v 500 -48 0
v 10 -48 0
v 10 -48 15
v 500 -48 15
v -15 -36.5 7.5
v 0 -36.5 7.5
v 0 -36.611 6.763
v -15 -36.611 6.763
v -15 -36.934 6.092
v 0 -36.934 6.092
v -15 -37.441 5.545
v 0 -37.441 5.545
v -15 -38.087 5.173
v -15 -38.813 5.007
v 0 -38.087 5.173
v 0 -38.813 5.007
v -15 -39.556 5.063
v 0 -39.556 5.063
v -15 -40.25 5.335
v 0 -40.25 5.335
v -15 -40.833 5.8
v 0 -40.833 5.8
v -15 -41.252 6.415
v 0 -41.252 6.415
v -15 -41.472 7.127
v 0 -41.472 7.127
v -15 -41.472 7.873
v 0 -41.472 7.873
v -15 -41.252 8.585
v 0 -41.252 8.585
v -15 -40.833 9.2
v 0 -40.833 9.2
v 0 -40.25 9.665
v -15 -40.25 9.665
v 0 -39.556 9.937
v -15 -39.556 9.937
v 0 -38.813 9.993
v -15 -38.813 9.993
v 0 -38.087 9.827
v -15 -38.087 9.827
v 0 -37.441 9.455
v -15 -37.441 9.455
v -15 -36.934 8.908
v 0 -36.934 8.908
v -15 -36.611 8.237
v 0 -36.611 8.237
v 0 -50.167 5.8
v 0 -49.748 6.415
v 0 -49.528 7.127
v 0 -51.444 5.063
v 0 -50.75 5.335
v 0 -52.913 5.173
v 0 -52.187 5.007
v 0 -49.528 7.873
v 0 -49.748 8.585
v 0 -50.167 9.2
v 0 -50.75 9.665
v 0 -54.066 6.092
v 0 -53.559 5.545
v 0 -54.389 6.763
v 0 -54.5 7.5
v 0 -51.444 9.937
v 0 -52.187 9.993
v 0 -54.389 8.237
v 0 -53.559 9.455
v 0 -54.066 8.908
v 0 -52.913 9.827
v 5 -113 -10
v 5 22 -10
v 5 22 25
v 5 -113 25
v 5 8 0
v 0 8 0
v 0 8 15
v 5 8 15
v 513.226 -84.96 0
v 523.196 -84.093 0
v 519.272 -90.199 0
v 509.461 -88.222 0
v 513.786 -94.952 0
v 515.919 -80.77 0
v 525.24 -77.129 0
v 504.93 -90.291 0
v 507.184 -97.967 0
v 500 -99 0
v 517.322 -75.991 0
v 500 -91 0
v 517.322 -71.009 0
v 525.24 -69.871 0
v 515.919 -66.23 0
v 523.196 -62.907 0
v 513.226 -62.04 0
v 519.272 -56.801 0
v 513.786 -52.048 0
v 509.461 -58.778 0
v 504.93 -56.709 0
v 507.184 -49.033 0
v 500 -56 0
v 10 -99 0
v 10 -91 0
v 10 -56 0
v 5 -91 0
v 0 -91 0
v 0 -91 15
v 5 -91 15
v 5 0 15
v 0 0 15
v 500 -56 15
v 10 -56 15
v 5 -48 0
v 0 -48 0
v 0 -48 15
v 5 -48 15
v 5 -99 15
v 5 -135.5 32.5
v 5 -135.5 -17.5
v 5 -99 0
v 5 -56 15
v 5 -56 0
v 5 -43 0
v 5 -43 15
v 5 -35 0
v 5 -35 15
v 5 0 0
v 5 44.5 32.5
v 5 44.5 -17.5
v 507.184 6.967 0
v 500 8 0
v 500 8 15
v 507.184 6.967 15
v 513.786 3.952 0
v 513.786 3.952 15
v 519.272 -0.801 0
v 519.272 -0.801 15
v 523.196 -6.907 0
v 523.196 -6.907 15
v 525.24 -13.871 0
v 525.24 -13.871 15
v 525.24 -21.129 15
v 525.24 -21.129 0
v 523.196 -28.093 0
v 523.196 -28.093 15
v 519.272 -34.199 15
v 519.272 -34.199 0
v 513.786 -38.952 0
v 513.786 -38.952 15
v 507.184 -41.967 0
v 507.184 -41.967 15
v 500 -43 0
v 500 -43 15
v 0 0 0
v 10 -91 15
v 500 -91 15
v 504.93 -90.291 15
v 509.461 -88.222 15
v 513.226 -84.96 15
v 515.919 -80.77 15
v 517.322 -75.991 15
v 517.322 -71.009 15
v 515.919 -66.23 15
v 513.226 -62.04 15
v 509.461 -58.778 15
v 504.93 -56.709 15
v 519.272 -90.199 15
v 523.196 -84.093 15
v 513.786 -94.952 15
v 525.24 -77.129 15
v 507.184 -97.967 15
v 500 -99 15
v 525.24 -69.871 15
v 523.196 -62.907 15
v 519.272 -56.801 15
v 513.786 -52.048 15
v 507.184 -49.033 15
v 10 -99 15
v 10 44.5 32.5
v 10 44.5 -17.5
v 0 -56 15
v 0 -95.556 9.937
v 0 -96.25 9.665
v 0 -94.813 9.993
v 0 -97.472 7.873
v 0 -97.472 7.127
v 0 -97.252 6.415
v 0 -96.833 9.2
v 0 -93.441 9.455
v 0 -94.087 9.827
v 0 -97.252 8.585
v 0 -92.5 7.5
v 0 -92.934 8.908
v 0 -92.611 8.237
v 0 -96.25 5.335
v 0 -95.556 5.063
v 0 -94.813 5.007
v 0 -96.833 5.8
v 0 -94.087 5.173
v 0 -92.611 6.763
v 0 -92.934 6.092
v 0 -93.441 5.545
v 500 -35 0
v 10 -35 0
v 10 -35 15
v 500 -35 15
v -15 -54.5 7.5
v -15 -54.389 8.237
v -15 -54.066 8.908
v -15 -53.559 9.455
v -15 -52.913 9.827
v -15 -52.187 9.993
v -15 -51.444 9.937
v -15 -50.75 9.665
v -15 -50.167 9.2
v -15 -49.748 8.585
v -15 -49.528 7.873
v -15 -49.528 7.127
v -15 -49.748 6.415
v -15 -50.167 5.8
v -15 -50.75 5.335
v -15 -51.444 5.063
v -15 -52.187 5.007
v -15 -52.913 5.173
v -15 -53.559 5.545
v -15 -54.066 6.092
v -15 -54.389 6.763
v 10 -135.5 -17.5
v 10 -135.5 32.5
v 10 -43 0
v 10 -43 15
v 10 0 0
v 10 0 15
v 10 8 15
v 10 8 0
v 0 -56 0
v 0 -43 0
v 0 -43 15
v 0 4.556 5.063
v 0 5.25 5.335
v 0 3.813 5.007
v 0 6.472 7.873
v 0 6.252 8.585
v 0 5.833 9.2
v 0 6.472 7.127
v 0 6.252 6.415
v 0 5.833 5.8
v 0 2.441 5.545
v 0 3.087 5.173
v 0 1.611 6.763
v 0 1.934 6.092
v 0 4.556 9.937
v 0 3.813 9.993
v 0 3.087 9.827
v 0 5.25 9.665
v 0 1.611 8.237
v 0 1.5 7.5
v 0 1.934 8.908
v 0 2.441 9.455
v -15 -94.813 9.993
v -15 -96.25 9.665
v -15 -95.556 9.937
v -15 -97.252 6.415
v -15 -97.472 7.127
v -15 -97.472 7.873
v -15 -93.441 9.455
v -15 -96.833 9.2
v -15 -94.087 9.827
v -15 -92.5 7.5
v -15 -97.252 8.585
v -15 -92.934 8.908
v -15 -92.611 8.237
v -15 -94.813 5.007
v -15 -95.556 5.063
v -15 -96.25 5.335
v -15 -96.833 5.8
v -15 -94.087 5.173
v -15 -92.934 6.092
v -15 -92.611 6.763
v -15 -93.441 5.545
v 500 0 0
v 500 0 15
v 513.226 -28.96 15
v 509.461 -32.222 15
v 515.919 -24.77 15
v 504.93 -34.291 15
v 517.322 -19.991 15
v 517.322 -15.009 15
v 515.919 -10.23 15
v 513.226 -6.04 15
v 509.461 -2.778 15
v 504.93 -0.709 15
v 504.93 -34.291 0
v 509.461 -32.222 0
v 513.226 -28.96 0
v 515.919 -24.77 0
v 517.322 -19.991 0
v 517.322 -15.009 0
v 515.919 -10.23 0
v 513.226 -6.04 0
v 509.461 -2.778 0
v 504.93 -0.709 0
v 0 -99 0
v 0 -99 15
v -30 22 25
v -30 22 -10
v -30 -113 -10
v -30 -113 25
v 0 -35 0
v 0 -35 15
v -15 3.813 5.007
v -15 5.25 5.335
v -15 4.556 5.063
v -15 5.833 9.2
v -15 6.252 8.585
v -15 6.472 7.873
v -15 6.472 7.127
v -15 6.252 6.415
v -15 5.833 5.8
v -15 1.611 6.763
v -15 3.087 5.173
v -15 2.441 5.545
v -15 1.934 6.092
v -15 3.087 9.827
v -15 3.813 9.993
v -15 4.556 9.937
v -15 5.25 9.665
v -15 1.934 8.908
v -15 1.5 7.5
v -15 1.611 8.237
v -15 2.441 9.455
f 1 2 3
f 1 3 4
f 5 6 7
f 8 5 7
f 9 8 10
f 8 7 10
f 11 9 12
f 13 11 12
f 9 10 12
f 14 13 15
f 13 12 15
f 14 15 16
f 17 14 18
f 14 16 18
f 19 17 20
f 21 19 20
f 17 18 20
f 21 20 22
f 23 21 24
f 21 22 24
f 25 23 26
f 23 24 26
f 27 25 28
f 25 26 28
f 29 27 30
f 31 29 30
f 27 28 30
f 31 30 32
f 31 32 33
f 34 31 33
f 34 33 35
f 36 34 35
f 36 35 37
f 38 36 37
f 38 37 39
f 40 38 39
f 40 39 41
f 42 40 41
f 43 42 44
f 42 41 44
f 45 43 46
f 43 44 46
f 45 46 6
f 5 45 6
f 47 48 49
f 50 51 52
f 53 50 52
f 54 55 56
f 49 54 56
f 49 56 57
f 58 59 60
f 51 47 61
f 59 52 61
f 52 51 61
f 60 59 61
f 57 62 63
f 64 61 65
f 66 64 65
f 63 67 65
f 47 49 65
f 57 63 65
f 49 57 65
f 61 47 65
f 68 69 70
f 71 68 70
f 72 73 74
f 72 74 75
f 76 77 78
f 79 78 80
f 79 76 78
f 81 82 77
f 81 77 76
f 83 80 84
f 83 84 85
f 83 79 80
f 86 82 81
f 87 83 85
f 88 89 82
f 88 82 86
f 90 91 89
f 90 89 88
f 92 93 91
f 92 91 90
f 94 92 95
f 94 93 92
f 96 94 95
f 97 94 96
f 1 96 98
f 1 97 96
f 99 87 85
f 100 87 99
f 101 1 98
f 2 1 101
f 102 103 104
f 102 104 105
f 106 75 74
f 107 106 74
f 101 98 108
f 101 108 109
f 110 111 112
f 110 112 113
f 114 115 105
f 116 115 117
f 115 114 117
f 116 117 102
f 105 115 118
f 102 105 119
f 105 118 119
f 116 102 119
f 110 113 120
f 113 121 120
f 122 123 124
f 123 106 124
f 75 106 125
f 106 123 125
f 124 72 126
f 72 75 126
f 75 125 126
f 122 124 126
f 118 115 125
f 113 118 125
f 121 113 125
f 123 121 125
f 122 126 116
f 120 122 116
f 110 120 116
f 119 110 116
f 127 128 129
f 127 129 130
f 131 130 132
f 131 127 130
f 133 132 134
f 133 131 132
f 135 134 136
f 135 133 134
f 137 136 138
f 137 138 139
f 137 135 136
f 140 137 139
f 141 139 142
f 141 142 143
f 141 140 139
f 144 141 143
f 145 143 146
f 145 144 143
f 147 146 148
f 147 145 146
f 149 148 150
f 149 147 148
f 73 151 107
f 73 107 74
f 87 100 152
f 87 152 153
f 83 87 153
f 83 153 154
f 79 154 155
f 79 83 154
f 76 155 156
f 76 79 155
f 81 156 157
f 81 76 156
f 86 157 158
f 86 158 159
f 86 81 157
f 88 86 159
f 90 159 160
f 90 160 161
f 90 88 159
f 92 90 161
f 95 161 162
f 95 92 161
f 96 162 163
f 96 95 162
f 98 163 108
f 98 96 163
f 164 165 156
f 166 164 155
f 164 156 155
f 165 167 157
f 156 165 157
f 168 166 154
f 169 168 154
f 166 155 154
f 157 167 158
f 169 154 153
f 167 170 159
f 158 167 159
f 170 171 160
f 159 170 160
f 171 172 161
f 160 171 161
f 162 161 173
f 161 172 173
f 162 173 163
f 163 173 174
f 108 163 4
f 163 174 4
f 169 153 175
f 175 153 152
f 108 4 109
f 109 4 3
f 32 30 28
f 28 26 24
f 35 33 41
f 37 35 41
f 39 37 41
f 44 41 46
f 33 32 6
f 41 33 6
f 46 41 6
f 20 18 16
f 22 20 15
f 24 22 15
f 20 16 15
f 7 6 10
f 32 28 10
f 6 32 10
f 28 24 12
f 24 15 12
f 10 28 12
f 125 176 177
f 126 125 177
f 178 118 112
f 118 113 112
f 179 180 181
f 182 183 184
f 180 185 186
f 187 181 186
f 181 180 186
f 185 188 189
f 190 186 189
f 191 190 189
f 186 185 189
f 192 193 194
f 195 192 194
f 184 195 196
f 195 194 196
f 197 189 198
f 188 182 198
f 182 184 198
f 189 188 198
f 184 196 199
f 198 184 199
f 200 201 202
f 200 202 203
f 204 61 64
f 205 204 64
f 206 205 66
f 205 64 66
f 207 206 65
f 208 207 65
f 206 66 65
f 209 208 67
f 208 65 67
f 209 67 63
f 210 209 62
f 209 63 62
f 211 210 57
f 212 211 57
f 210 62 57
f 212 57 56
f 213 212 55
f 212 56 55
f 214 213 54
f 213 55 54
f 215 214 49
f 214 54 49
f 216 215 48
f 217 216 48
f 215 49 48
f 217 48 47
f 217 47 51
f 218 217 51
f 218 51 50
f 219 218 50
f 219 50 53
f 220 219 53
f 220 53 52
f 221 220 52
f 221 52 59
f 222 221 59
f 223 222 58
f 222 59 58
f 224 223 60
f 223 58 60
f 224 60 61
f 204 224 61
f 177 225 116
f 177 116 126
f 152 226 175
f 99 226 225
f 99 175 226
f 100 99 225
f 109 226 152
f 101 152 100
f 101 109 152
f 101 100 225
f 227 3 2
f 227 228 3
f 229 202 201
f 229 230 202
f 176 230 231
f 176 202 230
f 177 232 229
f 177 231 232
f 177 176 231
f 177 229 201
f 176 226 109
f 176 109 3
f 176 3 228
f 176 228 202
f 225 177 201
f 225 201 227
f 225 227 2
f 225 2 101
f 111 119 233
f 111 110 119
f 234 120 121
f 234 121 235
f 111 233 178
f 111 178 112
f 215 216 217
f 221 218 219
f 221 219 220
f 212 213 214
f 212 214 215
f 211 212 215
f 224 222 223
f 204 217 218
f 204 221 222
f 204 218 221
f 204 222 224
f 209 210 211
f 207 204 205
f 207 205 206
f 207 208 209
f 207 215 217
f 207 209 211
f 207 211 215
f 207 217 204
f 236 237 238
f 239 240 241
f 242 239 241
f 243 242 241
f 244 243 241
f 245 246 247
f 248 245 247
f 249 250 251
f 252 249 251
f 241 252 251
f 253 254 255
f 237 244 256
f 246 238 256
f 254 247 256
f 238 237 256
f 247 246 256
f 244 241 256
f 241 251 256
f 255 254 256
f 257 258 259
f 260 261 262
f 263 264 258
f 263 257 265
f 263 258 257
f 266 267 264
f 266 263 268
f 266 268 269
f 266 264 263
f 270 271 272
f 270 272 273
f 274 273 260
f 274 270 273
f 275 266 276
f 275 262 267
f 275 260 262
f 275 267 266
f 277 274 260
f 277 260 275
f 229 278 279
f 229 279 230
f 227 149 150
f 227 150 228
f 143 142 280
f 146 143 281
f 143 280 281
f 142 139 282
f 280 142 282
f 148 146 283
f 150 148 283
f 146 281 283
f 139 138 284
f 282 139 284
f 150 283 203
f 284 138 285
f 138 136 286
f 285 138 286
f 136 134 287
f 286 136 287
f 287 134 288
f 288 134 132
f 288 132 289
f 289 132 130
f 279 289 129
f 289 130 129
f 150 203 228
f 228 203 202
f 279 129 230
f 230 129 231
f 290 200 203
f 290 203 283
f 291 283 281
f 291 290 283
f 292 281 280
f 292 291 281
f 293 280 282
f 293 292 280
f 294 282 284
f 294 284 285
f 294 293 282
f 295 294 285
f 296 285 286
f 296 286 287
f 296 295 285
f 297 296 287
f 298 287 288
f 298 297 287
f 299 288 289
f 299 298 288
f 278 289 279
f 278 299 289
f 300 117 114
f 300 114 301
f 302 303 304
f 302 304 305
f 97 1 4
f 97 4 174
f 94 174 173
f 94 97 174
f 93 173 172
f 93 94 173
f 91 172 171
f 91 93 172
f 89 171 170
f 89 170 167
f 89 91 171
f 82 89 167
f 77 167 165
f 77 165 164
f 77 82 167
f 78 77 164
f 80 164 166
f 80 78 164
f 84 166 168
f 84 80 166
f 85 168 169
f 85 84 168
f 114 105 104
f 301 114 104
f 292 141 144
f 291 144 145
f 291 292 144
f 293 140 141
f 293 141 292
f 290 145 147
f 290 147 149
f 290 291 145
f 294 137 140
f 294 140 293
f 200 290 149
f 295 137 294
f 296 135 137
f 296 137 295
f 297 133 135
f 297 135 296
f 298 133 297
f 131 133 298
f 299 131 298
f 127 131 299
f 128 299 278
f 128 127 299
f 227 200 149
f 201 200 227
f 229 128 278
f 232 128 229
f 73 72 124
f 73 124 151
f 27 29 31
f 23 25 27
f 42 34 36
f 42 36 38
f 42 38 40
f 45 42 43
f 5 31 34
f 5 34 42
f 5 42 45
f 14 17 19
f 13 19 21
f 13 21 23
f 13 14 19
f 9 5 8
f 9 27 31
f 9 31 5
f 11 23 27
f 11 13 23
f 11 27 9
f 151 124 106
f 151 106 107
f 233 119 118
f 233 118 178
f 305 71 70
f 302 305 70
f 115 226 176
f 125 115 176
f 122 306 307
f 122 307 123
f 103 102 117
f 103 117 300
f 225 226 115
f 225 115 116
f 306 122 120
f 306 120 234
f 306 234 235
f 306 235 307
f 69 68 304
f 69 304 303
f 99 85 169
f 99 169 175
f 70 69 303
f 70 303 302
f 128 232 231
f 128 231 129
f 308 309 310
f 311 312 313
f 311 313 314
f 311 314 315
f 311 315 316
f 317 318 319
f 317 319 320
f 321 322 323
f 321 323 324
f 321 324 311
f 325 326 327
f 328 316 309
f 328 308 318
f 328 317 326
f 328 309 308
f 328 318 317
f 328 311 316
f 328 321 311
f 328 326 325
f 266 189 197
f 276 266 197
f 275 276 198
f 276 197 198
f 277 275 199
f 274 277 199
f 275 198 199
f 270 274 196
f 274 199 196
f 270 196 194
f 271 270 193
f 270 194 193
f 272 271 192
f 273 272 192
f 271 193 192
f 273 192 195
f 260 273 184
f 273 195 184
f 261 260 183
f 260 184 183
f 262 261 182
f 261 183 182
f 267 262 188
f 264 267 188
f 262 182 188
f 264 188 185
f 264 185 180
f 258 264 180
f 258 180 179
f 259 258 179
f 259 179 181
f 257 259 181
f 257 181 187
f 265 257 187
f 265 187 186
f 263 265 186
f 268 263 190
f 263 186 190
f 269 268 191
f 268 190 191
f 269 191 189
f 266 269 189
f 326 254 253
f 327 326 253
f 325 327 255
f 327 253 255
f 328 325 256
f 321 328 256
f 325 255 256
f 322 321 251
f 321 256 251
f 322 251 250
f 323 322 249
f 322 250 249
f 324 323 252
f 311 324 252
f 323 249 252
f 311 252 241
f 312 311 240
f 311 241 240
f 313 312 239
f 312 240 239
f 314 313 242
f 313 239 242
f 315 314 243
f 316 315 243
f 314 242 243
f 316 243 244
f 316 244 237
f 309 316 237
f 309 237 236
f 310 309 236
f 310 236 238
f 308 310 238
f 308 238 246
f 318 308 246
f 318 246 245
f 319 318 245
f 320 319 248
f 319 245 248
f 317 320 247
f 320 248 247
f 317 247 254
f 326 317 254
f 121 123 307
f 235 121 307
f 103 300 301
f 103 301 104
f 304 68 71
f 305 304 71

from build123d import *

# Parameters (mm, degrees)
BOSS_EXTRUDE1_DEPTH   = 15
BOSS_EXTRUDE1_2_DEPTH = 15
SKETCH3_R             = 2.5
BOSS_EXTRUDE2_DEPTH   = 15
BOSS_EXTRUDE2_2_DEPTH = 15
BOSS_EXTRUDE2_3_DEPTH = 15
BOSS_EXTRUDE2_4_DEPTH = 15
SKETCH5_W             = 50
SKETCH5_H             = 180
BOSS_EXTRUDE3_DEPTH   = 5
SKETCH7_W             = 35
SKETCH7_H             = 135
BOSS_EXTRUDE4_DEPTH   = 35


with BuildPart() as part:
    # Sketch1 → Boss-Extrude1 (new body)
    with BuildSketch(Plane.XY):
        with BuildLine():
            Line((500, -43), (0, -43))
            Line((0, -43), (0, -35))
            Line((0, -35), (8, -35))
            Line((8, -35), (500, -35))
            ThreePointArc((500, -35), (517.5, -17.5), (500, 0))
            Line((500, 0), (8, 0))
            Line((8, 0), (0, 0))
            Line((0, 0), (0, 8))
            Line((0, 8), (500, 8))
            ThreePointArc((500, 8), (525.5, -17.5), (500, -43))
        make_face()
    extrude(amount=BOSS_EXTRUDE1_DEPTH)



with BuildPart() as body_2:
    # Sketch1 → Boss-Extrude1 2 (new body)
    with BuildSketch(Plane.XY):
        with BuildLine():
            Line((8, -56), (0, -56))
            Line((0, -56), (0, -48))
            Line((0, -48), (500, -48))
            ThreePointArc((500, -48), (525.5, -73.5), (500, -99))
            Line((500, -99), (0, -99))
            Line((0, -99), (0, -91))
            Line((0, -91), (8, -91))
            Line((8, -91), (500, -91))
            ThreePointArc((500, -91), (517.5, -73.5), (500, -56))
            Line((500, -56), (8, -56))
        make_face()
    extrude(amount=BOSS_EXTRUDE1_2_DEPTH)


with BuildPart() as body_3:
    # Sketch3 → Boss-Extrude2 (new body)
    with BuildSketch(Plane.ZY):
        with Locations(Location((7.5, 4, 0), (0, 0, 270))):
            Circle(SKETCH3_R)
    extrude(amount=BOSS_EXTRUDE2_DEPTH)


with BuildPart() as body_4:
    # Sketch3 → Boss-Extrude2 2 (new body)
    with BuildSketch(Plane.ZY):
        with Locations(Location((7.5, -39, 0), (0, 0, 90))):
            Circle(SKETCH3_R)
    extrude(amount=BOSS_EXTRUDE2_2_DEPTH)


with BuildPart() as body_5:
    # Sketch3 → Boss-Extrude2 3 (new body)
    with BuildSketch(Plane.ZY):
        with Locations(Location((7.5, -52, 0), (0, 0, 270))):
            Circle(SKETCH3_R)
    extrude(amount=BOSS_EXTRUDE2_3_DEPTH)


with BuildPart() as body_6:
    # Sketch3 → Boss-Extrude2 4 (new body)
    with BuildSketch(Plane.ZY):
        with Locations(Location((7.5, -95, 0), (0, 0, 90))):
            Circle(SKETCH3_R)
    extrude(amount=BOSS_EXTRUDE2_4_DEPTH)


with BuildPart() as part_1:
    add(part.part)

    add(body_2.part)  # Boss-Extrude3 merges body 2
    # Sketch5 → Boss-Extrude3 (add)
    with BuildSketch(Plane(origin=(10, 0, 0), x_dir=(0, 0, -1), z_dir=(1, 0, 0))):
        with Locations((-7.5, -45.5)):
            Rectangle(SKETCH5_W, SKETCH5_H)
    extrude(amount=-BOSS_EXTRUDE3_DEPTH)


with BuildPart() as body_6_2:
    # Sketch7 → Boss-Extrude4 (new body)
    with BuildSketch(Plane.ZY.offset(-5)):
        with Locations((7.5, -45.5)):
            Rectangle(SKETCH7_W, SKETCH7_H)
    extrude(amount=BOSS_EXTRUDE4_DEPTH)


solid = Compound([body_3.part, body_4.part, body_5.part, body_6.part, part_1.part, body_6_2.part])
